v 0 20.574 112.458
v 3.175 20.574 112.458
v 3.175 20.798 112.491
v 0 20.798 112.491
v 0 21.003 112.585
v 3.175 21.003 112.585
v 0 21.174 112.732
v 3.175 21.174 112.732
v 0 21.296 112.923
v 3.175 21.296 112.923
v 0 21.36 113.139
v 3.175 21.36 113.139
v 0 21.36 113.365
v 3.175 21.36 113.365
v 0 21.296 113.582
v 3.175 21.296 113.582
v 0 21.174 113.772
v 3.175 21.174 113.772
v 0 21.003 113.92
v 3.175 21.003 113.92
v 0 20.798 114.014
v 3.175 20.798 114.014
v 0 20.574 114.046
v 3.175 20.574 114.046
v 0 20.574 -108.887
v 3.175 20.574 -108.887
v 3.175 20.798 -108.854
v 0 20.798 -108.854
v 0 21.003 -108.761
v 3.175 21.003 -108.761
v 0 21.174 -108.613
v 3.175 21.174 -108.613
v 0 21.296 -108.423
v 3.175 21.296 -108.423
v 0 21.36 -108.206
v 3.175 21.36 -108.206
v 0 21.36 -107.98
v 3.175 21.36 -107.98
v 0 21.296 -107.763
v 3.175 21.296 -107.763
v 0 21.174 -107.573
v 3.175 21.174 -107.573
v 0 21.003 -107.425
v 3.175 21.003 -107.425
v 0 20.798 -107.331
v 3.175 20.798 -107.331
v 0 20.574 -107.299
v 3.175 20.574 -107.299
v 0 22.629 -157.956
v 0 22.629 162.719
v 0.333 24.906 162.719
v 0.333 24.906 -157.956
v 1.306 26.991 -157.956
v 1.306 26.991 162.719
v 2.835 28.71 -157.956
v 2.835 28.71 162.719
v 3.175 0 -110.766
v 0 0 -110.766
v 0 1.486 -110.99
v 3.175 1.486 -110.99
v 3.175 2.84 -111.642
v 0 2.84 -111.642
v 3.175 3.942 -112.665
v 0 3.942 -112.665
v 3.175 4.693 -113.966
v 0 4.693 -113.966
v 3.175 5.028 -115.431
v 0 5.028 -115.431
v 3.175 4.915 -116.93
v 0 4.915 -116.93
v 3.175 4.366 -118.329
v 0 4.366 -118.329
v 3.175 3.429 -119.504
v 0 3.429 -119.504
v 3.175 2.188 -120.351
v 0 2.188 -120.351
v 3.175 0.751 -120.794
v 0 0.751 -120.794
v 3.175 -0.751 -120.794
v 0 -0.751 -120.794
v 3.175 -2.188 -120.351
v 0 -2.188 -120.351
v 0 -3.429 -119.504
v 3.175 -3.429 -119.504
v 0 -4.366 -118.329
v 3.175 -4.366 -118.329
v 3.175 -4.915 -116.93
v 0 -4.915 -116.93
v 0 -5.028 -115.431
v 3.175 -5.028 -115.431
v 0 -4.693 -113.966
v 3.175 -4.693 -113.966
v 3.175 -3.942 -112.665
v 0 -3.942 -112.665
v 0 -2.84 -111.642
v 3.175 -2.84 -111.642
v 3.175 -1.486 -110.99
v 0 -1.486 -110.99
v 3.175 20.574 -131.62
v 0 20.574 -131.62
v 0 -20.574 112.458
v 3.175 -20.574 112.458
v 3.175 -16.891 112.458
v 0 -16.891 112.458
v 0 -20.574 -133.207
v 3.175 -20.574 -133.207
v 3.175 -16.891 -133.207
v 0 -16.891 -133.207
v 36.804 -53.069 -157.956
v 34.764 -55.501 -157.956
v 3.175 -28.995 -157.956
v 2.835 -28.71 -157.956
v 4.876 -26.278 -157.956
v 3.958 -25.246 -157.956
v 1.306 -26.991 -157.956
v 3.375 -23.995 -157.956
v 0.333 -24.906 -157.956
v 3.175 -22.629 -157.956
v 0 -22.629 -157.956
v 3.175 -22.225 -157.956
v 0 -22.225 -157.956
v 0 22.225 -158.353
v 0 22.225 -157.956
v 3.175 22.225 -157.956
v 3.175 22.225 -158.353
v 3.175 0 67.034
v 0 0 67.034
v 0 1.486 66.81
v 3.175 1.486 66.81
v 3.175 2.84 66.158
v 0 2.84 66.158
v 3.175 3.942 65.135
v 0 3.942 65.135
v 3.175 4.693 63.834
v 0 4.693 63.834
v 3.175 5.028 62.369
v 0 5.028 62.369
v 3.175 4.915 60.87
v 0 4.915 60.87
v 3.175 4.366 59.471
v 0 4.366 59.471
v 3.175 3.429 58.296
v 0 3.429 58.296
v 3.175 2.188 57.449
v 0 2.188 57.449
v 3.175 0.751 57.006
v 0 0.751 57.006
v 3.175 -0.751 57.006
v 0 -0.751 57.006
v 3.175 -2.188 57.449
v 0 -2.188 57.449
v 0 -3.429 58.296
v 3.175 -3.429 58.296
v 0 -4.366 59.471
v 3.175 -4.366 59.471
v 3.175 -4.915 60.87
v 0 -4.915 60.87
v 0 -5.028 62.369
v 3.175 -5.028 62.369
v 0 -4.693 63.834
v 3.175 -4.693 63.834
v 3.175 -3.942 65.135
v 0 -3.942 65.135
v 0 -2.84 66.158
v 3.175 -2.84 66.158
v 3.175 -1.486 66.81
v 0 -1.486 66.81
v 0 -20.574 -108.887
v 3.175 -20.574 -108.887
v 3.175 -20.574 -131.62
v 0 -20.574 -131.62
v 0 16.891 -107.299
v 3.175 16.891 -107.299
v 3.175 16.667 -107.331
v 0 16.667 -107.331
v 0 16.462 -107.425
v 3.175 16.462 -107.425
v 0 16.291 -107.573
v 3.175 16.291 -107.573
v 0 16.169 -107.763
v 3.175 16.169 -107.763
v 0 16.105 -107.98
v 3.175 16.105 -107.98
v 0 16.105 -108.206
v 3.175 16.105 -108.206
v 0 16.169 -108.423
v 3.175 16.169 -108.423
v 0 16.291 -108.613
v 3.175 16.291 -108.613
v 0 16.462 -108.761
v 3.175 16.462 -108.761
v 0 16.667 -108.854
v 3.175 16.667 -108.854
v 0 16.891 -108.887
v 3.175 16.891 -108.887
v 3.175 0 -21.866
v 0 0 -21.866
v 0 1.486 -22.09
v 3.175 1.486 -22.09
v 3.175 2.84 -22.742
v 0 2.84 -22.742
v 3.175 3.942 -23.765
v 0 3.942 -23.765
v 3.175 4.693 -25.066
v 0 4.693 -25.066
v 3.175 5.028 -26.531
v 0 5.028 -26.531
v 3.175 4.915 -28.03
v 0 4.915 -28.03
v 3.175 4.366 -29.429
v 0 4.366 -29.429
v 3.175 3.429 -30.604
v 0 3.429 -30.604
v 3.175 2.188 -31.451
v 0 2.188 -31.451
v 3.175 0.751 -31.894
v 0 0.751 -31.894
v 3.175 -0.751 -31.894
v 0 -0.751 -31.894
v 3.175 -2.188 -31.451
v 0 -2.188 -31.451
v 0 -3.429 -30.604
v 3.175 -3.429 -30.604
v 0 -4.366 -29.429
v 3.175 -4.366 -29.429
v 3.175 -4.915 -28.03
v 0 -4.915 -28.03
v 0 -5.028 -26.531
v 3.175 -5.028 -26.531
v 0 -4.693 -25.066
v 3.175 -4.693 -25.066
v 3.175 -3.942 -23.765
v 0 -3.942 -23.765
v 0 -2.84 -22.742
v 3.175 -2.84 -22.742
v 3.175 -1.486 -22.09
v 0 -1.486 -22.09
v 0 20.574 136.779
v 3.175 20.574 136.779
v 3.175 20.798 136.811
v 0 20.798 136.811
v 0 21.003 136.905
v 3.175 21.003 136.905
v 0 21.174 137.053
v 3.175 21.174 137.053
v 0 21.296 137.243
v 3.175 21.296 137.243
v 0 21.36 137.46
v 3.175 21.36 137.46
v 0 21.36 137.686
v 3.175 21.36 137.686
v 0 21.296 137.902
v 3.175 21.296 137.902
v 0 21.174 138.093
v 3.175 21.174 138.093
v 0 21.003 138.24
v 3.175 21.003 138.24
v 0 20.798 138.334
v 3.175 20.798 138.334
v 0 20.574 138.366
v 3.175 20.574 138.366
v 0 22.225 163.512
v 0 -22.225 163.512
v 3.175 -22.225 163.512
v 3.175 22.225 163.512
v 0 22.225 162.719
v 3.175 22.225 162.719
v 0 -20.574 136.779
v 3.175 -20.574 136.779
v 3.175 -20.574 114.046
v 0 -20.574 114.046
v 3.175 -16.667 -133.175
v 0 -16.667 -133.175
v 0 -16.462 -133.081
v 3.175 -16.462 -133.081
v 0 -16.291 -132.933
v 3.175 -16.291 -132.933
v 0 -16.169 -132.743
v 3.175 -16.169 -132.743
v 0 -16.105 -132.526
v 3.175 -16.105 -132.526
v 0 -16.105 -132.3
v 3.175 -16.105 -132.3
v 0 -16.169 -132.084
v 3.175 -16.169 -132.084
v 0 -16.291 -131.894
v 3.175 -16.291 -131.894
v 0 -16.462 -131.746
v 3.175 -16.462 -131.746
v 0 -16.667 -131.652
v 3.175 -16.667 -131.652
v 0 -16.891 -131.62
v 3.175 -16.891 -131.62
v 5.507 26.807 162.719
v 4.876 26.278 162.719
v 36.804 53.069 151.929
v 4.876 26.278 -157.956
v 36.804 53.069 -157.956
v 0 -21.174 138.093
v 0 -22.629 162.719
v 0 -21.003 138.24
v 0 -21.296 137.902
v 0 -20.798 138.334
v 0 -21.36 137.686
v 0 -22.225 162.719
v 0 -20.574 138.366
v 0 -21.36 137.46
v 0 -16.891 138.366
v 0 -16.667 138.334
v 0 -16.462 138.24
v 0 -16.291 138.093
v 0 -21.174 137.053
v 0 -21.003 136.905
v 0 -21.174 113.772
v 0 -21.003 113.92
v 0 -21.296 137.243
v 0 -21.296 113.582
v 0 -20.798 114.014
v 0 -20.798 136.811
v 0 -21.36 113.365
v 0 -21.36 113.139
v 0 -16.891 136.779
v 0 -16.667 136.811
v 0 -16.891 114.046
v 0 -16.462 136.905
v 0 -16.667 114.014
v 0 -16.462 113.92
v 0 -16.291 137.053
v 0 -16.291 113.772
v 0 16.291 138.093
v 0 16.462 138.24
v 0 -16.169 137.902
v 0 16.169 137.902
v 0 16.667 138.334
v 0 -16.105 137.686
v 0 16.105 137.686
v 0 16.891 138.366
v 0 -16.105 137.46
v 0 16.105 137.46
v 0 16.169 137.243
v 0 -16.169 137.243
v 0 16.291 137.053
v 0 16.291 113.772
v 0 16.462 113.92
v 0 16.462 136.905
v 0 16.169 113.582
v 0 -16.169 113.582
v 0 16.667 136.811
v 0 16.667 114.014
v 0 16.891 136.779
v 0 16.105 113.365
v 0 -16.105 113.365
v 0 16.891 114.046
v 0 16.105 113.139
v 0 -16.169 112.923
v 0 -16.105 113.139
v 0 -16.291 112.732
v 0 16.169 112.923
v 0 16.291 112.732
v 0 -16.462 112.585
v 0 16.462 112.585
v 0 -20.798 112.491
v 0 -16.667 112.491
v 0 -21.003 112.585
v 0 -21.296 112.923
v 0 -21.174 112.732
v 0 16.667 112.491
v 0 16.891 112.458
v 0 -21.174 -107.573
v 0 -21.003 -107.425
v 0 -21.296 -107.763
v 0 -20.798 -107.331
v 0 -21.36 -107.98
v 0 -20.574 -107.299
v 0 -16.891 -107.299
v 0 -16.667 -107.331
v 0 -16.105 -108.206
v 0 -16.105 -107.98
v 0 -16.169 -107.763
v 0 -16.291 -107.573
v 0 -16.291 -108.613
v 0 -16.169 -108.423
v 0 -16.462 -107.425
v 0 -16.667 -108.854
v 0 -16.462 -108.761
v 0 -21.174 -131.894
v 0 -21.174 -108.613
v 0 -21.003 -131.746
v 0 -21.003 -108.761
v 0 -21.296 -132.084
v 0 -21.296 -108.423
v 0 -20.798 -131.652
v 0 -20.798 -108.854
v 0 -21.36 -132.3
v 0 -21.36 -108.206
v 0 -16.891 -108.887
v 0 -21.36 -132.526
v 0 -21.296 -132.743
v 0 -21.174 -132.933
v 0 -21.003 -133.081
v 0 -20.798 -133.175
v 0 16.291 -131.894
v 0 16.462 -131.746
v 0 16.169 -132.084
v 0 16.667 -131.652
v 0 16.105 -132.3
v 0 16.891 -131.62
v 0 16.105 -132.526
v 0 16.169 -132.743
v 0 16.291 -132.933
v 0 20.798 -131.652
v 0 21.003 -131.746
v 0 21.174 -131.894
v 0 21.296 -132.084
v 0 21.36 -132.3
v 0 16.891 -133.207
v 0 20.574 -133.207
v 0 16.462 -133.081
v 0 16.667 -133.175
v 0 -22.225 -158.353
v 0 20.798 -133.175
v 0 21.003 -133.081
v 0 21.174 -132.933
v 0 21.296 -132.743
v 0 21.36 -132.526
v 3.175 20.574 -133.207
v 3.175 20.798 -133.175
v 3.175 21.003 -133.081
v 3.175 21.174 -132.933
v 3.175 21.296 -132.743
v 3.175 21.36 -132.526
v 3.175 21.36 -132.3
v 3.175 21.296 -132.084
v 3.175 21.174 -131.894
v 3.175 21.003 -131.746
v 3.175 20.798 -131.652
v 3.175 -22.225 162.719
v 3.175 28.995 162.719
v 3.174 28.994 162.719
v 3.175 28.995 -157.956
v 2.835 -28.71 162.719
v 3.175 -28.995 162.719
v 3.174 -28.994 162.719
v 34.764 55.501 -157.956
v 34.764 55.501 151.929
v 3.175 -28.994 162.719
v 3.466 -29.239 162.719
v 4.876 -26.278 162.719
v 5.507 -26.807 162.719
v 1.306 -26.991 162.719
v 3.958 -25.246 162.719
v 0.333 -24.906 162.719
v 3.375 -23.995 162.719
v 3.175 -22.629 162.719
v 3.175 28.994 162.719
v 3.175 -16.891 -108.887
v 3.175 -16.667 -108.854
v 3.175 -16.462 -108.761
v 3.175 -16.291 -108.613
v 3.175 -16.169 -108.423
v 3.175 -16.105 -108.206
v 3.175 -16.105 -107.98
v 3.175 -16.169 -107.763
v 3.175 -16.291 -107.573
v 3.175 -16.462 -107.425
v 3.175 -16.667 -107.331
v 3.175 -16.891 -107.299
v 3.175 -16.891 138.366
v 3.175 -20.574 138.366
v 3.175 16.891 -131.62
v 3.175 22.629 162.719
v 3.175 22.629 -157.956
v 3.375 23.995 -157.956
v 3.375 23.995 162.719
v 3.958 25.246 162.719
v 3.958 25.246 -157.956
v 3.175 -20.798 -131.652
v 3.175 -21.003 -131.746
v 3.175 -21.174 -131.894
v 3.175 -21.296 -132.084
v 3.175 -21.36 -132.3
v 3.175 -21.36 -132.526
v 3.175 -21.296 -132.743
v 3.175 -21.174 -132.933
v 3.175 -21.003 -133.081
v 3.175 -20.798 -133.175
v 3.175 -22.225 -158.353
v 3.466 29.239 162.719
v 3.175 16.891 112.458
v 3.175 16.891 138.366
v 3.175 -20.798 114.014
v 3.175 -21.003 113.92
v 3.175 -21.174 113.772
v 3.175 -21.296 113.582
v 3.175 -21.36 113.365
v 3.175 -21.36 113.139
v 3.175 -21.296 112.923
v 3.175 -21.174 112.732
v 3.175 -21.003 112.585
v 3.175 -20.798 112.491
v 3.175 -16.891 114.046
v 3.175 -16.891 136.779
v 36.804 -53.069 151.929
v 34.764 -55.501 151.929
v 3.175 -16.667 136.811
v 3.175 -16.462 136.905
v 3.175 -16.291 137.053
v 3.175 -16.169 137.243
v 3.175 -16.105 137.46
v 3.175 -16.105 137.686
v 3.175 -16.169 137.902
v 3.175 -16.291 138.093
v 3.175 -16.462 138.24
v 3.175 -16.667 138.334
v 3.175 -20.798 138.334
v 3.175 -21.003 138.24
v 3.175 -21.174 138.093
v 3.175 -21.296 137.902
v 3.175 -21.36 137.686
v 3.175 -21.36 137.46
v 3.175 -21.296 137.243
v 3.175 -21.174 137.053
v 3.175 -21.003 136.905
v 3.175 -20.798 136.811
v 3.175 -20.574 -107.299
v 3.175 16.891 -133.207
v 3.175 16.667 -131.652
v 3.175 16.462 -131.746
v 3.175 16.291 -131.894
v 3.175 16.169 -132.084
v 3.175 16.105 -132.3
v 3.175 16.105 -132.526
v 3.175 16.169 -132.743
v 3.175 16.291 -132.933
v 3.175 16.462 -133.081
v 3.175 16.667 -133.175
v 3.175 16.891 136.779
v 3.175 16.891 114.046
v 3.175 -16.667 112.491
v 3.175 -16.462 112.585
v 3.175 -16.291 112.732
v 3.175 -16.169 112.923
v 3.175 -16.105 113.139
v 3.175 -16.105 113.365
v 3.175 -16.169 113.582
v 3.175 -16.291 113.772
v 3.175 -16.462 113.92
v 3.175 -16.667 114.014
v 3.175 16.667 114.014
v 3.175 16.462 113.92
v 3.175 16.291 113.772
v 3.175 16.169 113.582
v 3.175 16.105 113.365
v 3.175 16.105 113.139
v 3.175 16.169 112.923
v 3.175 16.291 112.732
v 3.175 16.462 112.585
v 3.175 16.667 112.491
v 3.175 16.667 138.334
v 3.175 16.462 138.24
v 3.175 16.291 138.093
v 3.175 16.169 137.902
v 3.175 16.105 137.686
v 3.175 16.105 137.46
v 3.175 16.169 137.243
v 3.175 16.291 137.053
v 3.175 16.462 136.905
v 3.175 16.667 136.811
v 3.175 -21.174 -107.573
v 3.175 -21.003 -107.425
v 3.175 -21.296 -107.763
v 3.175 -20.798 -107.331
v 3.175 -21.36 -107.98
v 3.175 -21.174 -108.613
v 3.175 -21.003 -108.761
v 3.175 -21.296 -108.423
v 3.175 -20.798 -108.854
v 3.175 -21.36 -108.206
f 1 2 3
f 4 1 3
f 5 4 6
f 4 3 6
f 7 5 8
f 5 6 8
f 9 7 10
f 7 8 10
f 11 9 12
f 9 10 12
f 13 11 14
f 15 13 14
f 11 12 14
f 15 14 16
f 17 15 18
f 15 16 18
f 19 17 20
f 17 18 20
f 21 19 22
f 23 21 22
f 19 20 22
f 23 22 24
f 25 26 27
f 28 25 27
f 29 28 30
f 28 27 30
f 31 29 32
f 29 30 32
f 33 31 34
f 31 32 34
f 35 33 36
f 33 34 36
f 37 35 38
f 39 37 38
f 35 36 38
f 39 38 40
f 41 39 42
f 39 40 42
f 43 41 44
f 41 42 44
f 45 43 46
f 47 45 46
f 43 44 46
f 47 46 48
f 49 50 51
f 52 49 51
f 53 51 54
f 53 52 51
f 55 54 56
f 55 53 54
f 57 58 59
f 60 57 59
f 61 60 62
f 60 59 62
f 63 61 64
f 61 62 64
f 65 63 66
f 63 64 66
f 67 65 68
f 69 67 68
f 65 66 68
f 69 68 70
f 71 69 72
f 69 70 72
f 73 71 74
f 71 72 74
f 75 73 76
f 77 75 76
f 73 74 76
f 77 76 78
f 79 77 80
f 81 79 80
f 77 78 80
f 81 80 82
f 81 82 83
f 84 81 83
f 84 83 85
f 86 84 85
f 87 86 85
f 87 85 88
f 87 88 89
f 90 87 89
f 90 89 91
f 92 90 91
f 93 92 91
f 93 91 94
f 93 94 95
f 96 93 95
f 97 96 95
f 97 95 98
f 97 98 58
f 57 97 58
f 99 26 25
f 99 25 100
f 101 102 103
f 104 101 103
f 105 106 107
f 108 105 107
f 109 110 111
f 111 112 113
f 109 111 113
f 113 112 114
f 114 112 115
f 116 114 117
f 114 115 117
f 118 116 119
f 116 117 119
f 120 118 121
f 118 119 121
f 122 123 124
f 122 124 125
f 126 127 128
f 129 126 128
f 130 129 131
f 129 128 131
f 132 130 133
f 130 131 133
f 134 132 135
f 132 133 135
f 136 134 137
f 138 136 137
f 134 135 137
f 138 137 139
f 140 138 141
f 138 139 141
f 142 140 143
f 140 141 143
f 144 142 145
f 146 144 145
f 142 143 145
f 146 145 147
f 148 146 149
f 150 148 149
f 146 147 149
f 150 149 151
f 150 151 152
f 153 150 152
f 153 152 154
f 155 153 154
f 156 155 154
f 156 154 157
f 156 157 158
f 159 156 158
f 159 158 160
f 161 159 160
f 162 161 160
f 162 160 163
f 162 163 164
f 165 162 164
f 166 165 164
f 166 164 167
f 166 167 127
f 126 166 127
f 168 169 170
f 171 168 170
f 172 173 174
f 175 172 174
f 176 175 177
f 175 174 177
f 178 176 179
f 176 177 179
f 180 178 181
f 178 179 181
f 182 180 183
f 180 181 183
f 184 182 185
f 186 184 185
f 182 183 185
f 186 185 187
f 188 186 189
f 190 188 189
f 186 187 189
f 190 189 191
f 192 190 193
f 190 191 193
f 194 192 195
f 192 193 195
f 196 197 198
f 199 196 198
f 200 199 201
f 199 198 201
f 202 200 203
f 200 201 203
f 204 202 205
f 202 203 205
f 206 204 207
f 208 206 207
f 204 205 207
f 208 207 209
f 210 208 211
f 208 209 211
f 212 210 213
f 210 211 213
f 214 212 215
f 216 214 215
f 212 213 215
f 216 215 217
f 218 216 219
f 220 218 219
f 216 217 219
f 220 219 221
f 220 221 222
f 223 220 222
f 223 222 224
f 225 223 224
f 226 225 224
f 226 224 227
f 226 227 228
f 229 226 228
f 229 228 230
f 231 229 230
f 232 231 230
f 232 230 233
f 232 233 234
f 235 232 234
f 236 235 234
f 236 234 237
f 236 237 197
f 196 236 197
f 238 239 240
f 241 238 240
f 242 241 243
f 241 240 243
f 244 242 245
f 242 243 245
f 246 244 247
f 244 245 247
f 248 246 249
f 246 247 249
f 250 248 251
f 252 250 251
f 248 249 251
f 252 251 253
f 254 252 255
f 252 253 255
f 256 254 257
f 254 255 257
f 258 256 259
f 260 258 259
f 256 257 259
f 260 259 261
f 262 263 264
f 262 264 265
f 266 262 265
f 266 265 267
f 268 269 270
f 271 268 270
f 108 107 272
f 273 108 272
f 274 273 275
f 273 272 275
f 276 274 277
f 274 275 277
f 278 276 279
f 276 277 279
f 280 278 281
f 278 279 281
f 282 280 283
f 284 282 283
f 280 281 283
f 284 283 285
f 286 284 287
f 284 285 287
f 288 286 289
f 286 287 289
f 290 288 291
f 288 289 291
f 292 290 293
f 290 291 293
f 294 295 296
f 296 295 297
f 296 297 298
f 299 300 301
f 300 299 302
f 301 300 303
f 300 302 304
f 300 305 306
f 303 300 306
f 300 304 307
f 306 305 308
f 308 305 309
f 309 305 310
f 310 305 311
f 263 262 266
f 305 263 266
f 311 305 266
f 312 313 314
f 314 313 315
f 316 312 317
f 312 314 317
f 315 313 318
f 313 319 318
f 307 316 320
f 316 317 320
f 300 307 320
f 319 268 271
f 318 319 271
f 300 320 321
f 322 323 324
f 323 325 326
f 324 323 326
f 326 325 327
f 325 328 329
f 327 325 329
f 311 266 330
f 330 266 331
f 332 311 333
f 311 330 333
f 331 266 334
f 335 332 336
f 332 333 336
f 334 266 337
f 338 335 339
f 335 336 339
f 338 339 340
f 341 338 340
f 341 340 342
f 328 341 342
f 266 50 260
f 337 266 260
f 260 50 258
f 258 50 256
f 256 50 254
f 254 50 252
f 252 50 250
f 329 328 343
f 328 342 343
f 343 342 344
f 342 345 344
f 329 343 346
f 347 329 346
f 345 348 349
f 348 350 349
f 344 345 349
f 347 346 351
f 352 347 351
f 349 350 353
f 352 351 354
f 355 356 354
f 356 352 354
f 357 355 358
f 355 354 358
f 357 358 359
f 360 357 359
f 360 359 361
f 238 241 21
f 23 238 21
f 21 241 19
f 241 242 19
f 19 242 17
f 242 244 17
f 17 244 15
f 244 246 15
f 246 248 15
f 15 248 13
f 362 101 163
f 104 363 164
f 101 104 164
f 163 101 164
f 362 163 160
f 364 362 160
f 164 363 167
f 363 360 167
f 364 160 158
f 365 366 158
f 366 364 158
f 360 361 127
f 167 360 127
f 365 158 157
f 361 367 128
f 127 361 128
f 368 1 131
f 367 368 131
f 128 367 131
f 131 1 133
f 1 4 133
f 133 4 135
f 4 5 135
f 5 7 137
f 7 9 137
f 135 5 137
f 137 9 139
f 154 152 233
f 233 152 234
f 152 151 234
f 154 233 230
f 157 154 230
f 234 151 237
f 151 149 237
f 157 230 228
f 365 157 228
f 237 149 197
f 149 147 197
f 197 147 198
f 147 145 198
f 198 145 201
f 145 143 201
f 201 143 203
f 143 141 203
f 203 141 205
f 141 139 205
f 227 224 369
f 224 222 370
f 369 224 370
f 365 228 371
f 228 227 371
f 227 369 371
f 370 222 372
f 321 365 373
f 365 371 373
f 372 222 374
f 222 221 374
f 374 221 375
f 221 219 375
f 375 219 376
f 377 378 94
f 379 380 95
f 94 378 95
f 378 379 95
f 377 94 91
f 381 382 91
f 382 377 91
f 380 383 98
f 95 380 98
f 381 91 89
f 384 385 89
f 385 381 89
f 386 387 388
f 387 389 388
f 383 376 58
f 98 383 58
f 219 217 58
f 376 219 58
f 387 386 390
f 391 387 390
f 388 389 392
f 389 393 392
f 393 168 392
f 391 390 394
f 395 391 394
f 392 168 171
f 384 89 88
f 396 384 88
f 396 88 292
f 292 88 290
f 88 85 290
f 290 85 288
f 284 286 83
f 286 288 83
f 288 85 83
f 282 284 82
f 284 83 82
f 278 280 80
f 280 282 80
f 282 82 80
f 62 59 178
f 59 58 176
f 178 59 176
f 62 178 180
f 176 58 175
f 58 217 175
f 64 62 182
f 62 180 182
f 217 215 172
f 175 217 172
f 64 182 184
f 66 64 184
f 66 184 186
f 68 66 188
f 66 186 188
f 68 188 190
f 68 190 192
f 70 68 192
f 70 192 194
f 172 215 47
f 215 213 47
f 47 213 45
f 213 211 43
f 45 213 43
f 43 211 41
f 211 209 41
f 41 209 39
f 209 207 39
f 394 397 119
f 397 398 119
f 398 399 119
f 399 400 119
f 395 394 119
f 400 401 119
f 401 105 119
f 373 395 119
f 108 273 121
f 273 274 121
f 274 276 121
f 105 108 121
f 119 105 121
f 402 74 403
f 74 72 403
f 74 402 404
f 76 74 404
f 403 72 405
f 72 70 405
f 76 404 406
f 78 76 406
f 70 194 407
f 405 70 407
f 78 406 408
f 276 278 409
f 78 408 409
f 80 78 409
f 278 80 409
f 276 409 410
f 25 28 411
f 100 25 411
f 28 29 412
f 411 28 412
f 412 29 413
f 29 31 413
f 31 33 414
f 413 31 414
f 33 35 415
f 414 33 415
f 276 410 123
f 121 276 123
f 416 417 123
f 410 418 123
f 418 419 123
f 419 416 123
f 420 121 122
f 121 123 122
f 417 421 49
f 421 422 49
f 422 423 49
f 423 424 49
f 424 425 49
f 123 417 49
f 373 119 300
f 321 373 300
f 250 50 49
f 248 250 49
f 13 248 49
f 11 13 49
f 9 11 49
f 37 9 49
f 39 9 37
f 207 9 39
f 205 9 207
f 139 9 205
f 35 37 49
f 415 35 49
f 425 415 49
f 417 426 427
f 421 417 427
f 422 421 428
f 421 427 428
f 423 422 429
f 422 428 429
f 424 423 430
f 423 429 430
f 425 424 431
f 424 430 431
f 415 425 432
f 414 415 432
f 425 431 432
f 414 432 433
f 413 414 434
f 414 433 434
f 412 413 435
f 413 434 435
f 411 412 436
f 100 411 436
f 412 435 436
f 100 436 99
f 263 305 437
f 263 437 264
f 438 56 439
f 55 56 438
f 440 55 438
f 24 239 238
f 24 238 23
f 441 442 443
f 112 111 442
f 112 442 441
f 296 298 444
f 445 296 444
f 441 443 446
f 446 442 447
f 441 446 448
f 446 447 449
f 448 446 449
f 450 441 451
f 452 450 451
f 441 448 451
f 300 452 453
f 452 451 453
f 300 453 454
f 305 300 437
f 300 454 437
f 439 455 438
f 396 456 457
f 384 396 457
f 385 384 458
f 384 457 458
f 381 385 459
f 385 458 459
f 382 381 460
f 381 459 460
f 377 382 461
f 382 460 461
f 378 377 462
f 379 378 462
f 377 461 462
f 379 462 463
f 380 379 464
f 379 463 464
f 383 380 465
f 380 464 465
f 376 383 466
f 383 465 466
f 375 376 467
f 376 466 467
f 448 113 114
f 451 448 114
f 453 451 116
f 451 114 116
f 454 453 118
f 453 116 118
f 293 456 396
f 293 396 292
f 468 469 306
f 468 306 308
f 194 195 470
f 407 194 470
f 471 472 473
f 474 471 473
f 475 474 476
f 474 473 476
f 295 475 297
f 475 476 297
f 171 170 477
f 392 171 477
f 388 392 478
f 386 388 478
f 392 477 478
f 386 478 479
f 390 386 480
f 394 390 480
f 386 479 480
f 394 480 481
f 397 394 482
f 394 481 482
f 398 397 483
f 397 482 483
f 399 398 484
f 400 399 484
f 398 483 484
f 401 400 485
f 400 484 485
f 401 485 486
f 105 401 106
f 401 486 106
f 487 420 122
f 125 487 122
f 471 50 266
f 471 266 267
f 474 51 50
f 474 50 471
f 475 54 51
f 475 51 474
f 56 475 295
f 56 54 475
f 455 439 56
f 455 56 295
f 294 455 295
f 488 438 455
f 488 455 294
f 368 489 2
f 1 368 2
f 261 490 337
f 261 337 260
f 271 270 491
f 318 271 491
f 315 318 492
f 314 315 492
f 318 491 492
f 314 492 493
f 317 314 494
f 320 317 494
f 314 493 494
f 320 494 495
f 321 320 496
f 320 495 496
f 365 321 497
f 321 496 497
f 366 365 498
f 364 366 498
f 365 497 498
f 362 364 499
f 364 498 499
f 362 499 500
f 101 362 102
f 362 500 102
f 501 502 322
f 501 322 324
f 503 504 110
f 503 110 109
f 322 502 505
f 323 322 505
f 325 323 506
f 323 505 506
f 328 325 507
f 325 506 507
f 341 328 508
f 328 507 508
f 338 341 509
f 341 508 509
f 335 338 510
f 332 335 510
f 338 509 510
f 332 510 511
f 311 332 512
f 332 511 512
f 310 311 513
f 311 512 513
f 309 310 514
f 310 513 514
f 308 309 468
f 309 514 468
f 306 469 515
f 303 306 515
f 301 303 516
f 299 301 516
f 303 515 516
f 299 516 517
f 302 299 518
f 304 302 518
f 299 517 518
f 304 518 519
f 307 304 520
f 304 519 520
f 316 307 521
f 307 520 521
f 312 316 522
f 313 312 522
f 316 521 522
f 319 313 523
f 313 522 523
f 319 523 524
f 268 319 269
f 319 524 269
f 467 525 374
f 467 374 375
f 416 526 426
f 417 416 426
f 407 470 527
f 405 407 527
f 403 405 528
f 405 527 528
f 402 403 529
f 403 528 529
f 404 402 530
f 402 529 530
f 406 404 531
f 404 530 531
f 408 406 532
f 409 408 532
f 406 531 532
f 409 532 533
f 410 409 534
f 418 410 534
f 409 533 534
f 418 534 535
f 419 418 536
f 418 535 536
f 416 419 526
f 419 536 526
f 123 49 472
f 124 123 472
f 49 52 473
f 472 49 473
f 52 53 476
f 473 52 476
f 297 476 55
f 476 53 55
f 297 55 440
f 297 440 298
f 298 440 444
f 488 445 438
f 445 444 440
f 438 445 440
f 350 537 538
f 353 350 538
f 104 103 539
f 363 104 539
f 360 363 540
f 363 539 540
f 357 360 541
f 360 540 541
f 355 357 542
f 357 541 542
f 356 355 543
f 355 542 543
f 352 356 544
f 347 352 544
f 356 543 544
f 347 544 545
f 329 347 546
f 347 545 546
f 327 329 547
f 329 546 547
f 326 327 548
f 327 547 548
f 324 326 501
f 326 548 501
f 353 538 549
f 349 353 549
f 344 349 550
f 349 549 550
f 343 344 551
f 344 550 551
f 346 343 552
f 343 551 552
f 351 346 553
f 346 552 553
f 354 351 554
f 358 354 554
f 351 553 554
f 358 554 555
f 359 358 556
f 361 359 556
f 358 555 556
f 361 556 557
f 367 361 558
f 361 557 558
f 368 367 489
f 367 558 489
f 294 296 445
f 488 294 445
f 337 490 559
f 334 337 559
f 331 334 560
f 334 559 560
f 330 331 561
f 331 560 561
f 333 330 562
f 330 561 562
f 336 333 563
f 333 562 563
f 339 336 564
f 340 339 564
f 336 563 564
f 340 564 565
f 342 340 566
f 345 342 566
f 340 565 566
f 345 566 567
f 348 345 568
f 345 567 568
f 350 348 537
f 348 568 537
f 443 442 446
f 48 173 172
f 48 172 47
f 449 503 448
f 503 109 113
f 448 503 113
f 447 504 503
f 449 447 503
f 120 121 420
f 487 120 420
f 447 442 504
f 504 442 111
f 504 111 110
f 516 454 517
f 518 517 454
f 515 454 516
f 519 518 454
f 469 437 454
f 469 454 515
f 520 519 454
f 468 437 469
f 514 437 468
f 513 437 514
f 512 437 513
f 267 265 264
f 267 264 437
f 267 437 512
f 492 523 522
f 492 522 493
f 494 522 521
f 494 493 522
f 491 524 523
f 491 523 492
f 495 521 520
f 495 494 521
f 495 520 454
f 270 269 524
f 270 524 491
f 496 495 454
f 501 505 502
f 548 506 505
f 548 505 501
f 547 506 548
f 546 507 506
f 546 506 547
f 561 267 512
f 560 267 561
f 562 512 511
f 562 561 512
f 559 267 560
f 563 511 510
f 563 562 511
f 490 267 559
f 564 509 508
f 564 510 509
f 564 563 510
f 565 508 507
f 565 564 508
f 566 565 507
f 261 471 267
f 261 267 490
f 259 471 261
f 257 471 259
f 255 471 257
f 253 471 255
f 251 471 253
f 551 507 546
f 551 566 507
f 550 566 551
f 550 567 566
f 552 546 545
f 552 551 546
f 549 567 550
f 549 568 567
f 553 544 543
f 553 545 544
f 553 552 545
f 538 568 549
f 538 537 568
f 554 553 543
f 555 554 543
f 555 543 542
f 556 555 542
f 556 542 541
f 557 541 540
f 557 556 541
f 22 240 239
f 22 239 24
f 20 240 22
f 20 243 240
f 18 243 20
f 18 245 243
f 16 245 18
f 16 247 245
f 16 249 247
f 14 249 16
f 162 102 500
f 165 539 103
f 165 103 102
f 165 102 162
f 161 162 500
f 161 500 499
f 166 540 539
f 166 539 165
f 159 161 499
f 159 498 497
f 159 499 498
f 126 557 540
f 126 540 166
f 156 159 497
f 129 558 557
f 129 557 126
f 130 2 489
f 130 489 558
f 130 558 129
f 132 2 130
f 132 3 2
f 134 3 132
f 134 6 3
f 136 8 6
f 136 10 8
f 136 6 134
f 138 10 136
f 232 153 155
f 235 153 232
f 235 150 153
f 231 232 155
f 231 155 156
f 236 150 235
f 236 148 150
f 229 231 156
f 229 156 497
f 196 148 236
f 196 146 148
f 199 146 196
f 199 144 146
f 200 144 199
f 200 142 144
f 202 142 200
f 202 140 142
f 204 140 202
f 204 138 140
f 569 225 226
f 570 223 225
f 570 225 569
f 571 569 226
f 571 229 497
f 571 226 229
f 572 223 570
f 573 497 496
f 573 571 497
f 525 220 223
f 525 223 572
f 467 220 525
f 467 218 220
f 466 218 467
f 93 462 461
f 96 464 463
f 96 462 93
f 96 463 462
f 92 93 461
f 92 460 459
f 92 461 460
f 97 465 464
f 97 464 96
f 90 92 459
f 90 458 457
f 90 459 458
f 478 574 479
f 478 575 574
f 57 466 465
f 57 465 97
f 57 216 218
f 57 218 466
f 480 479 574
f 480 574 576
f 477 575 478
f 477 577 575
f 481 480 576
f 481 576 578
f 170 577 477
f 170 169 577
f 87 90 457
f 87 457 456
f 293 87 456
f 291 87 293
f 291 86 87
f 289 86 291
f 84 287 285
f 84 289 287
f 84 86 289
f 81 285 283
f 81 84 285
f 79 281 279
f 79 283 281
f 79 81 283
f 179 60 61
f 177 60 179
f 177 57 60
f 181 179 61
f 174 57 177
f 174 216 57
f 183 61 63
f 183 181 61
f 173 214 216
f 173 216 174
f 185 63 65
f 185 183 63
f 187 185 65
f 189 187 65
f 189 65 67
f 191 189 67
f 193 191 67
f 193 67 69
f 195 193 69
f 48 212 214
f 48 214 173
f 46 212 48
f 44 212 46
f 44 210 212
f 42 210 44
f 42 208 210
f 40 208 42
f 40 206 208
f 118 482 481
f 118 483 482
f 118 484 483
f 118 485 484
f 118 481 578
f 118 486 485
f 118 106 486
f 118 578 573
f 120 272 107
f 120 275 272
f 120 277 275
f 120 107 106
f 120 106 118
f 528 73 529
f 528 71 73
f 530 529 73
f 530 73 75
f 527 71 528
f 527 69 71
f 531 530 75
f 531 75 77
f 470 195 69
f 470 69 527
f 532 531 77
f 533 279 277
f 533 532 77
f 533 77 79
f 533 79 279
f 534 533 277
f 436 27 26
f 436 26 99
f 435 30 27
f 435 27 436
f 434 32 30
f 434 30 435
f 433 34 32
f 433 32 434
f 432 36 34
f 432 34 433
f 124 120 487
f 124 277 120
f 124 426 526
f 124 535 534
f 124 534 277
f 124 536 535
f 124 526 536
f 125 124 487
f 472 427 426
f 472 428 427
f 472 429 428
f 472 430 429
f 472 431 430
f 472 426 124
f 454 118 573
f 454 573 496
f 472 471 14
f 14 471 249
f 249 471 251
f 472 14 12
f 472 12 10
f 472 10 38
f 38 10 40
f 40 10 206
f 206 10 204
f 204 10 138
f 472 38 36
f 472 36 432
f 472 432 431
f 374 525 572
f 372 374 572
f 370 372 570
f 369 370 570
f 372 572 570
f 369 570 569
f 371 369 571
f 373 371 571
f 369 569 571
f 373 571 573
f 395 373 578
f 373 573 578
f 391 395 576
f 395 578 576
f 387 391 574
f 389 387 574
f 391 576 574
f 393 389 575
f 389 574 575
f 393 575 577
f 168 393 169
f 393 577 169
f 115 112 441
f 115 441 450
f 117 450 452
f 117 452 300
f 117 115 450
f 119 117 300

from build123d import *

# Parameters (mm, degrees)
SKETCH1_W               = 1.984375
SKETCH1_H               = 44.45
SKETCH1_W_2             = 1.5875
SKETCH1_H_2             = 41.275
BOSS_EXTRUDE1_DEPTH     = 3.175
SKETCH11_W              = 1.5875
SKETCH11_H              = 6.769262927
SKETCH11_H_2            = 6.35
BOSS_EXTRUDE2_DEPTH     = 3.175
SKETCHED_START          = -157.95625
SKETCHED_BEND1_DEPTH    = 320.675
SKETCHED_BEND1_2_DEPTH  = 320.675
SKETCHED_START_2        = -28.869188599
SKETCHED_BEND1_3_DEPTH  = 34.81577629
F_3_8_CLEARANCE_HOLE1_D = 10.0838
SKETCH9_W               = 25.908
SKETCH9_H               = 3.683
SKETCH9_W_2             = 25.4
SKETCH9_H_2             = 3.175
CUT_EXTRUDE1_DEPTH      = 176.919307022
SKETCH10_R              = 0.79375
CUT_EXTRUDE2_DEPTH      = 176.919307022


with BuildPart() as part:
    # Sketch1 → Boss-Extrude1 (new body)
    with BuildSketch(Plane(origin=(0, 0, 0), x_dir=(0, 0, -1), z_dir=(1, 0, 0))):
        Polygon((-163.5125, 22.225), (-161.13125, 22.225), (-161.13125, 25.4), (-161.13125, 28.575), (-162.71875, 28.994262927), (-151.928642345, 69.85), (156.36875, 69.85), (156.36875, -69.85), (-151.928642345, -69.85), (-162.71875, -28.994262927), (-161.13125, -28.575), (-161.13125, -25.4), (-161.13125, -22.225), (-163.5125, -22.225), align=None)
        with Locations((157.3609375, 0)):
            Rectangle(SKETCH1_W, SKETCH1_H)
        with Locations((157.1625, -49.2125)):
            Rectangle(SKETCH1_W_2, SKETCH1_H_2)
        with Locations((157.1625, 49.2125)):
            Rectangle(SKETCH1_W_2, SKETCH1_H_2)
    extrude(amount=BOSS_EXTRUDE1_DEPTH)

    # Sketch11 → Boss-Extrude2 (add)
    with BuildSketch(Plane(origin=(3.175, 0, 0), x_dir=(0, 0, -1), z_dir=(1, 0, 0))):
        with Locations((-161.925, 25.609631464)):
            Rectangle(SKETCH11_W, SKETCH11_H)
        with Locations((-161.925, -25.609631464)):
            Rectangle(SKETCH11_W, SKETCH11_H)
        with Locations((157.1625, 25.4)):
            Rectangle(SKETCH11_W, SKETCH11_H_2)
        with Locations((157.1625, -25.4)):
            Rectangle(SKETCH11_W, SKETCH11_H_2)
    extrude(amount=-BOSS_EXTRUDE2_DEPTH)

    # Sketched Bend1: read off the stored shape, not the designer's step
    # Sketched Bend1 outline → Sketched Bend1 (cut)
    with BuildSketch(Plane.XY.offset(SKETCHED_START)):
        with BuildLine():
            Line((2.835373348, 28.70976758), (3.175, 28.994748178))
            Line((3.175, 28.994748178), (3.175, 69.85))
            Line((3.175, 69.85), (0, 69.85))
            Line((0, 69.85), (0, 22.629289812))
            ThreePointArc((0, 22.629289812), (0.74368194, 25.983822265), (2.835373348, 28.70976758))
        make_face()
        with BuildLine():
            Line((3.175, -69.85), (3.175, -28.994748178))
            Line((3.175, -28.994748178), (2.835373348, -28.70976758))
            ThreePointArc((2.835373348, -28.70976758), (0.74368194, -25.983822265), (0, -22.629289812))
            Line((0, -22.629289812), (0, -69.85))
            Line((0, -69.85), (3.175, -69.85))
        make_face()
    extrude(amount=SKETCHED_BEND1_DEPTH, mode=Mode.SUBTRACT)

    # Sketched Bend1 2 outline → Sketched Bend1 2 (add)
    with BuildSketch(Plane.XY.offset(SKETCHED_START)):
        with BuildLine():
            ThreePointArc((3.175, 22.629289812), (3.621209164, 24.642009284), (4.876224009, 26.277576473))
            Line((4.876224009, 26.277576473), (36.804412363, 53.068507545))
            Line((36.804412363, 53.068507545), (34.763561702, 55.500698652))
            Line((34.763561702, 55.500698652), (3.175, 28.994748178))
            Line((3.175, 28.994748178), (3.175, 22.629289812))
        make_face()
        with BuildLine():
            ThreePointArc((4.876224009, -26.277576473), (3.621209164, -24.642009284), (3.175, -22.629289812))
            Line((3.175, -22.629289812), (3.175, -28.994748178))
            Line((3.175, -28.994748178), (34.763561702, -55.500698652))
            Line((34.763561702, -55.500698652), (36.804412363, -53.068507545))
            Line((36.804412363, -53.068507545), (4.876224009, -26.277576473))
        make_face()
    extrude(amount=SKETCHED_BEND1_2_DEPTH)

    # Sketched Bend1 3 outline → Sketched Bend1 3 (cut)
    with BuildSketch(Plane(origin=(0, 0, 0), x_dir=(0, 1, 0), z_dir=(0.9801420201505087, 0, -0.19829679860068306)).offset(SKETCHED_START_2)):
        Polygon((0, 165.039953435), (26.80694597, 160.579525039), (55.500698652, 155.80514942), (57, 155.555679513), (57, 168), (17.789728089, 168), align=None)
        Polygon((-26.80694597, 160.579525039), (0, 165.039953435), (-17.789728089, 168), (-57, 168), (-57, 155.555679513), (-55.500698652, 155.80514942), align=None)
    extrude(amount=SKETCHED_BEND1_3_DEPTH, mode=Mode.SUBTRACT)

    # 3/8 Clearance Hole1 (through all)
    with Locations(Plane(origin=(3.175, 0, 0), x_dir=(0, 0, -1), z_dir=(1, 0, 0))):
        with Locations((115.808125, 0), (26.908125, 0), (-61.991875, 0)):
            Hole(F_3_8_CLEARANCE_HOLE1_D / 2)

    # Sketch9 → Cut-Extrude1 (cut, through all)
    # profile 1 of 4: a face of its own
    with BuildSketch(Plane(origin=(3.175, 0, 0), x_dir=(0, 0, -1), z_dir=(1, 0, 0))):
        with Locations((-125.4125, 18.7325)):
            Rectangle(SKETCH9_W, SKETCH9_H)
        with Locations((-125.4125, 18.7325)):
            Rectangle(SKETCH9_W_2, SKETCH9_H_2, mode=Mode.SUBTRACT)
    # profile 2 of 4: a face of its own
    with BuildSketch(Plane(origin=(3.175, 0, 0), x_dir=(0, 0, -1), z_dir=(1, 0, 0))):
        with Locations((-125.4125, -18.7325)):
            Rectangle(SKETCH9_W, SKETCH9_H)
        with Locations((-125.4125, -18.7325)):
            Rectangle(SKETCH9_W_2, SKETCH9_H_2, mode=Mode.SUBTRACT)
    # profile 3 of 4: a face of its own
    with BuildSketch(Plane(origin=(3.175, 0, 0), x_dir=(0, 0, -1), z_dir=(1, 0, 0))):
        with Locations((120.253125, 18.7325)):
            Rectangle(SKETCH9_W, SKETCH9_H)
        with Locations((120.253125, 18.7325)):
            Rectangle(SKETCH9_W_2, SKETCH9_H_2, mode=Mode.SUBTRACT)
    # profile 4 of 4: a face of its own
    with BuildSketch(Plane(origin=(3.175, 0, 0), x_dir=(0, 0, -1), z_dir=(1, 0, 0))):
        with Locations((120.253125, -18.7325)):
            Rectangle(SKETCH9_W, SKETCH9_H)
        with Locations((120.253125, -18.7325)):
            Rectangle(SKETCH9_W_2, SKETCH9_H_2, mode=Mode.SUBTRACT)
    extrude(amount=-CUT_EXTRUDE1_DEPTH, mode=Mode.SUBTRACT)


with BuildPart() as body_2:
    # of the pieces the cut leaves, the one that is kept (cut_extrude1_keep)
    add(part.part.solids().sort_by_distance((0, 22.225, 163.5125))[0])

    # Sketch10 → Cut-Extrude2 (cut, through all)
    with BuildSketch(Plane(origin=(3.175, 0, 0), x_dir=(0, 0, -1), z_dir=(1, 0, 0))):
        with Locations((108.092875, 16.891)):
            Circle(SKETCH10_R)
        with Locations((108.092875, 20.574)):
            Circle(SKETCH10_R)
        with Locations((132.413375, 20.574)):
            Circle(SKETCH10_R)
        with Locations((132.413375, 16.891)):
            Circle(SKETCH10_R)
        with Locations((132.413375, -16.891)):
            Circle(SKETCH10_R)
        with Locations((132.413375, -20.574)):
            Circle(SKETCH10_R)
        with Locations((108.092875, -20.574)):
            Circle(SKETCH10_R)
        with Locations((108.092875, -16.891)):
            Circle(SKETCH10_R)
        with Locations((-113.25225, -16.891)):
            Circle(SKETCH10_R)
        with Locations((-113.25225, -20.574)):
            Circle(SKETCH10_R)
        with Locations((-137.57275, -20.574)):
            Circle(SKETCH10_R)
        with Locations((-137.57275, -16.891)):
            Circle(SKETCH10_R)
        with Locations((-137.57275, 16.891)):
            Circle(SKETCH10_R)
        with Locations((-137.57275, 20.574)):
            Circle(SKETCH10_R)
        with Locations((-113.25225, 20.574)):
            Circle(SKETCH10_R)
        with Locations((-113.25225, 16.891)):
            Circle(SKETCH10_R)
    extrude(amount=-CUT_EXTRUDE2_DEPTH, mode=Mode.SUBTRACT)


solid = body_2.part
